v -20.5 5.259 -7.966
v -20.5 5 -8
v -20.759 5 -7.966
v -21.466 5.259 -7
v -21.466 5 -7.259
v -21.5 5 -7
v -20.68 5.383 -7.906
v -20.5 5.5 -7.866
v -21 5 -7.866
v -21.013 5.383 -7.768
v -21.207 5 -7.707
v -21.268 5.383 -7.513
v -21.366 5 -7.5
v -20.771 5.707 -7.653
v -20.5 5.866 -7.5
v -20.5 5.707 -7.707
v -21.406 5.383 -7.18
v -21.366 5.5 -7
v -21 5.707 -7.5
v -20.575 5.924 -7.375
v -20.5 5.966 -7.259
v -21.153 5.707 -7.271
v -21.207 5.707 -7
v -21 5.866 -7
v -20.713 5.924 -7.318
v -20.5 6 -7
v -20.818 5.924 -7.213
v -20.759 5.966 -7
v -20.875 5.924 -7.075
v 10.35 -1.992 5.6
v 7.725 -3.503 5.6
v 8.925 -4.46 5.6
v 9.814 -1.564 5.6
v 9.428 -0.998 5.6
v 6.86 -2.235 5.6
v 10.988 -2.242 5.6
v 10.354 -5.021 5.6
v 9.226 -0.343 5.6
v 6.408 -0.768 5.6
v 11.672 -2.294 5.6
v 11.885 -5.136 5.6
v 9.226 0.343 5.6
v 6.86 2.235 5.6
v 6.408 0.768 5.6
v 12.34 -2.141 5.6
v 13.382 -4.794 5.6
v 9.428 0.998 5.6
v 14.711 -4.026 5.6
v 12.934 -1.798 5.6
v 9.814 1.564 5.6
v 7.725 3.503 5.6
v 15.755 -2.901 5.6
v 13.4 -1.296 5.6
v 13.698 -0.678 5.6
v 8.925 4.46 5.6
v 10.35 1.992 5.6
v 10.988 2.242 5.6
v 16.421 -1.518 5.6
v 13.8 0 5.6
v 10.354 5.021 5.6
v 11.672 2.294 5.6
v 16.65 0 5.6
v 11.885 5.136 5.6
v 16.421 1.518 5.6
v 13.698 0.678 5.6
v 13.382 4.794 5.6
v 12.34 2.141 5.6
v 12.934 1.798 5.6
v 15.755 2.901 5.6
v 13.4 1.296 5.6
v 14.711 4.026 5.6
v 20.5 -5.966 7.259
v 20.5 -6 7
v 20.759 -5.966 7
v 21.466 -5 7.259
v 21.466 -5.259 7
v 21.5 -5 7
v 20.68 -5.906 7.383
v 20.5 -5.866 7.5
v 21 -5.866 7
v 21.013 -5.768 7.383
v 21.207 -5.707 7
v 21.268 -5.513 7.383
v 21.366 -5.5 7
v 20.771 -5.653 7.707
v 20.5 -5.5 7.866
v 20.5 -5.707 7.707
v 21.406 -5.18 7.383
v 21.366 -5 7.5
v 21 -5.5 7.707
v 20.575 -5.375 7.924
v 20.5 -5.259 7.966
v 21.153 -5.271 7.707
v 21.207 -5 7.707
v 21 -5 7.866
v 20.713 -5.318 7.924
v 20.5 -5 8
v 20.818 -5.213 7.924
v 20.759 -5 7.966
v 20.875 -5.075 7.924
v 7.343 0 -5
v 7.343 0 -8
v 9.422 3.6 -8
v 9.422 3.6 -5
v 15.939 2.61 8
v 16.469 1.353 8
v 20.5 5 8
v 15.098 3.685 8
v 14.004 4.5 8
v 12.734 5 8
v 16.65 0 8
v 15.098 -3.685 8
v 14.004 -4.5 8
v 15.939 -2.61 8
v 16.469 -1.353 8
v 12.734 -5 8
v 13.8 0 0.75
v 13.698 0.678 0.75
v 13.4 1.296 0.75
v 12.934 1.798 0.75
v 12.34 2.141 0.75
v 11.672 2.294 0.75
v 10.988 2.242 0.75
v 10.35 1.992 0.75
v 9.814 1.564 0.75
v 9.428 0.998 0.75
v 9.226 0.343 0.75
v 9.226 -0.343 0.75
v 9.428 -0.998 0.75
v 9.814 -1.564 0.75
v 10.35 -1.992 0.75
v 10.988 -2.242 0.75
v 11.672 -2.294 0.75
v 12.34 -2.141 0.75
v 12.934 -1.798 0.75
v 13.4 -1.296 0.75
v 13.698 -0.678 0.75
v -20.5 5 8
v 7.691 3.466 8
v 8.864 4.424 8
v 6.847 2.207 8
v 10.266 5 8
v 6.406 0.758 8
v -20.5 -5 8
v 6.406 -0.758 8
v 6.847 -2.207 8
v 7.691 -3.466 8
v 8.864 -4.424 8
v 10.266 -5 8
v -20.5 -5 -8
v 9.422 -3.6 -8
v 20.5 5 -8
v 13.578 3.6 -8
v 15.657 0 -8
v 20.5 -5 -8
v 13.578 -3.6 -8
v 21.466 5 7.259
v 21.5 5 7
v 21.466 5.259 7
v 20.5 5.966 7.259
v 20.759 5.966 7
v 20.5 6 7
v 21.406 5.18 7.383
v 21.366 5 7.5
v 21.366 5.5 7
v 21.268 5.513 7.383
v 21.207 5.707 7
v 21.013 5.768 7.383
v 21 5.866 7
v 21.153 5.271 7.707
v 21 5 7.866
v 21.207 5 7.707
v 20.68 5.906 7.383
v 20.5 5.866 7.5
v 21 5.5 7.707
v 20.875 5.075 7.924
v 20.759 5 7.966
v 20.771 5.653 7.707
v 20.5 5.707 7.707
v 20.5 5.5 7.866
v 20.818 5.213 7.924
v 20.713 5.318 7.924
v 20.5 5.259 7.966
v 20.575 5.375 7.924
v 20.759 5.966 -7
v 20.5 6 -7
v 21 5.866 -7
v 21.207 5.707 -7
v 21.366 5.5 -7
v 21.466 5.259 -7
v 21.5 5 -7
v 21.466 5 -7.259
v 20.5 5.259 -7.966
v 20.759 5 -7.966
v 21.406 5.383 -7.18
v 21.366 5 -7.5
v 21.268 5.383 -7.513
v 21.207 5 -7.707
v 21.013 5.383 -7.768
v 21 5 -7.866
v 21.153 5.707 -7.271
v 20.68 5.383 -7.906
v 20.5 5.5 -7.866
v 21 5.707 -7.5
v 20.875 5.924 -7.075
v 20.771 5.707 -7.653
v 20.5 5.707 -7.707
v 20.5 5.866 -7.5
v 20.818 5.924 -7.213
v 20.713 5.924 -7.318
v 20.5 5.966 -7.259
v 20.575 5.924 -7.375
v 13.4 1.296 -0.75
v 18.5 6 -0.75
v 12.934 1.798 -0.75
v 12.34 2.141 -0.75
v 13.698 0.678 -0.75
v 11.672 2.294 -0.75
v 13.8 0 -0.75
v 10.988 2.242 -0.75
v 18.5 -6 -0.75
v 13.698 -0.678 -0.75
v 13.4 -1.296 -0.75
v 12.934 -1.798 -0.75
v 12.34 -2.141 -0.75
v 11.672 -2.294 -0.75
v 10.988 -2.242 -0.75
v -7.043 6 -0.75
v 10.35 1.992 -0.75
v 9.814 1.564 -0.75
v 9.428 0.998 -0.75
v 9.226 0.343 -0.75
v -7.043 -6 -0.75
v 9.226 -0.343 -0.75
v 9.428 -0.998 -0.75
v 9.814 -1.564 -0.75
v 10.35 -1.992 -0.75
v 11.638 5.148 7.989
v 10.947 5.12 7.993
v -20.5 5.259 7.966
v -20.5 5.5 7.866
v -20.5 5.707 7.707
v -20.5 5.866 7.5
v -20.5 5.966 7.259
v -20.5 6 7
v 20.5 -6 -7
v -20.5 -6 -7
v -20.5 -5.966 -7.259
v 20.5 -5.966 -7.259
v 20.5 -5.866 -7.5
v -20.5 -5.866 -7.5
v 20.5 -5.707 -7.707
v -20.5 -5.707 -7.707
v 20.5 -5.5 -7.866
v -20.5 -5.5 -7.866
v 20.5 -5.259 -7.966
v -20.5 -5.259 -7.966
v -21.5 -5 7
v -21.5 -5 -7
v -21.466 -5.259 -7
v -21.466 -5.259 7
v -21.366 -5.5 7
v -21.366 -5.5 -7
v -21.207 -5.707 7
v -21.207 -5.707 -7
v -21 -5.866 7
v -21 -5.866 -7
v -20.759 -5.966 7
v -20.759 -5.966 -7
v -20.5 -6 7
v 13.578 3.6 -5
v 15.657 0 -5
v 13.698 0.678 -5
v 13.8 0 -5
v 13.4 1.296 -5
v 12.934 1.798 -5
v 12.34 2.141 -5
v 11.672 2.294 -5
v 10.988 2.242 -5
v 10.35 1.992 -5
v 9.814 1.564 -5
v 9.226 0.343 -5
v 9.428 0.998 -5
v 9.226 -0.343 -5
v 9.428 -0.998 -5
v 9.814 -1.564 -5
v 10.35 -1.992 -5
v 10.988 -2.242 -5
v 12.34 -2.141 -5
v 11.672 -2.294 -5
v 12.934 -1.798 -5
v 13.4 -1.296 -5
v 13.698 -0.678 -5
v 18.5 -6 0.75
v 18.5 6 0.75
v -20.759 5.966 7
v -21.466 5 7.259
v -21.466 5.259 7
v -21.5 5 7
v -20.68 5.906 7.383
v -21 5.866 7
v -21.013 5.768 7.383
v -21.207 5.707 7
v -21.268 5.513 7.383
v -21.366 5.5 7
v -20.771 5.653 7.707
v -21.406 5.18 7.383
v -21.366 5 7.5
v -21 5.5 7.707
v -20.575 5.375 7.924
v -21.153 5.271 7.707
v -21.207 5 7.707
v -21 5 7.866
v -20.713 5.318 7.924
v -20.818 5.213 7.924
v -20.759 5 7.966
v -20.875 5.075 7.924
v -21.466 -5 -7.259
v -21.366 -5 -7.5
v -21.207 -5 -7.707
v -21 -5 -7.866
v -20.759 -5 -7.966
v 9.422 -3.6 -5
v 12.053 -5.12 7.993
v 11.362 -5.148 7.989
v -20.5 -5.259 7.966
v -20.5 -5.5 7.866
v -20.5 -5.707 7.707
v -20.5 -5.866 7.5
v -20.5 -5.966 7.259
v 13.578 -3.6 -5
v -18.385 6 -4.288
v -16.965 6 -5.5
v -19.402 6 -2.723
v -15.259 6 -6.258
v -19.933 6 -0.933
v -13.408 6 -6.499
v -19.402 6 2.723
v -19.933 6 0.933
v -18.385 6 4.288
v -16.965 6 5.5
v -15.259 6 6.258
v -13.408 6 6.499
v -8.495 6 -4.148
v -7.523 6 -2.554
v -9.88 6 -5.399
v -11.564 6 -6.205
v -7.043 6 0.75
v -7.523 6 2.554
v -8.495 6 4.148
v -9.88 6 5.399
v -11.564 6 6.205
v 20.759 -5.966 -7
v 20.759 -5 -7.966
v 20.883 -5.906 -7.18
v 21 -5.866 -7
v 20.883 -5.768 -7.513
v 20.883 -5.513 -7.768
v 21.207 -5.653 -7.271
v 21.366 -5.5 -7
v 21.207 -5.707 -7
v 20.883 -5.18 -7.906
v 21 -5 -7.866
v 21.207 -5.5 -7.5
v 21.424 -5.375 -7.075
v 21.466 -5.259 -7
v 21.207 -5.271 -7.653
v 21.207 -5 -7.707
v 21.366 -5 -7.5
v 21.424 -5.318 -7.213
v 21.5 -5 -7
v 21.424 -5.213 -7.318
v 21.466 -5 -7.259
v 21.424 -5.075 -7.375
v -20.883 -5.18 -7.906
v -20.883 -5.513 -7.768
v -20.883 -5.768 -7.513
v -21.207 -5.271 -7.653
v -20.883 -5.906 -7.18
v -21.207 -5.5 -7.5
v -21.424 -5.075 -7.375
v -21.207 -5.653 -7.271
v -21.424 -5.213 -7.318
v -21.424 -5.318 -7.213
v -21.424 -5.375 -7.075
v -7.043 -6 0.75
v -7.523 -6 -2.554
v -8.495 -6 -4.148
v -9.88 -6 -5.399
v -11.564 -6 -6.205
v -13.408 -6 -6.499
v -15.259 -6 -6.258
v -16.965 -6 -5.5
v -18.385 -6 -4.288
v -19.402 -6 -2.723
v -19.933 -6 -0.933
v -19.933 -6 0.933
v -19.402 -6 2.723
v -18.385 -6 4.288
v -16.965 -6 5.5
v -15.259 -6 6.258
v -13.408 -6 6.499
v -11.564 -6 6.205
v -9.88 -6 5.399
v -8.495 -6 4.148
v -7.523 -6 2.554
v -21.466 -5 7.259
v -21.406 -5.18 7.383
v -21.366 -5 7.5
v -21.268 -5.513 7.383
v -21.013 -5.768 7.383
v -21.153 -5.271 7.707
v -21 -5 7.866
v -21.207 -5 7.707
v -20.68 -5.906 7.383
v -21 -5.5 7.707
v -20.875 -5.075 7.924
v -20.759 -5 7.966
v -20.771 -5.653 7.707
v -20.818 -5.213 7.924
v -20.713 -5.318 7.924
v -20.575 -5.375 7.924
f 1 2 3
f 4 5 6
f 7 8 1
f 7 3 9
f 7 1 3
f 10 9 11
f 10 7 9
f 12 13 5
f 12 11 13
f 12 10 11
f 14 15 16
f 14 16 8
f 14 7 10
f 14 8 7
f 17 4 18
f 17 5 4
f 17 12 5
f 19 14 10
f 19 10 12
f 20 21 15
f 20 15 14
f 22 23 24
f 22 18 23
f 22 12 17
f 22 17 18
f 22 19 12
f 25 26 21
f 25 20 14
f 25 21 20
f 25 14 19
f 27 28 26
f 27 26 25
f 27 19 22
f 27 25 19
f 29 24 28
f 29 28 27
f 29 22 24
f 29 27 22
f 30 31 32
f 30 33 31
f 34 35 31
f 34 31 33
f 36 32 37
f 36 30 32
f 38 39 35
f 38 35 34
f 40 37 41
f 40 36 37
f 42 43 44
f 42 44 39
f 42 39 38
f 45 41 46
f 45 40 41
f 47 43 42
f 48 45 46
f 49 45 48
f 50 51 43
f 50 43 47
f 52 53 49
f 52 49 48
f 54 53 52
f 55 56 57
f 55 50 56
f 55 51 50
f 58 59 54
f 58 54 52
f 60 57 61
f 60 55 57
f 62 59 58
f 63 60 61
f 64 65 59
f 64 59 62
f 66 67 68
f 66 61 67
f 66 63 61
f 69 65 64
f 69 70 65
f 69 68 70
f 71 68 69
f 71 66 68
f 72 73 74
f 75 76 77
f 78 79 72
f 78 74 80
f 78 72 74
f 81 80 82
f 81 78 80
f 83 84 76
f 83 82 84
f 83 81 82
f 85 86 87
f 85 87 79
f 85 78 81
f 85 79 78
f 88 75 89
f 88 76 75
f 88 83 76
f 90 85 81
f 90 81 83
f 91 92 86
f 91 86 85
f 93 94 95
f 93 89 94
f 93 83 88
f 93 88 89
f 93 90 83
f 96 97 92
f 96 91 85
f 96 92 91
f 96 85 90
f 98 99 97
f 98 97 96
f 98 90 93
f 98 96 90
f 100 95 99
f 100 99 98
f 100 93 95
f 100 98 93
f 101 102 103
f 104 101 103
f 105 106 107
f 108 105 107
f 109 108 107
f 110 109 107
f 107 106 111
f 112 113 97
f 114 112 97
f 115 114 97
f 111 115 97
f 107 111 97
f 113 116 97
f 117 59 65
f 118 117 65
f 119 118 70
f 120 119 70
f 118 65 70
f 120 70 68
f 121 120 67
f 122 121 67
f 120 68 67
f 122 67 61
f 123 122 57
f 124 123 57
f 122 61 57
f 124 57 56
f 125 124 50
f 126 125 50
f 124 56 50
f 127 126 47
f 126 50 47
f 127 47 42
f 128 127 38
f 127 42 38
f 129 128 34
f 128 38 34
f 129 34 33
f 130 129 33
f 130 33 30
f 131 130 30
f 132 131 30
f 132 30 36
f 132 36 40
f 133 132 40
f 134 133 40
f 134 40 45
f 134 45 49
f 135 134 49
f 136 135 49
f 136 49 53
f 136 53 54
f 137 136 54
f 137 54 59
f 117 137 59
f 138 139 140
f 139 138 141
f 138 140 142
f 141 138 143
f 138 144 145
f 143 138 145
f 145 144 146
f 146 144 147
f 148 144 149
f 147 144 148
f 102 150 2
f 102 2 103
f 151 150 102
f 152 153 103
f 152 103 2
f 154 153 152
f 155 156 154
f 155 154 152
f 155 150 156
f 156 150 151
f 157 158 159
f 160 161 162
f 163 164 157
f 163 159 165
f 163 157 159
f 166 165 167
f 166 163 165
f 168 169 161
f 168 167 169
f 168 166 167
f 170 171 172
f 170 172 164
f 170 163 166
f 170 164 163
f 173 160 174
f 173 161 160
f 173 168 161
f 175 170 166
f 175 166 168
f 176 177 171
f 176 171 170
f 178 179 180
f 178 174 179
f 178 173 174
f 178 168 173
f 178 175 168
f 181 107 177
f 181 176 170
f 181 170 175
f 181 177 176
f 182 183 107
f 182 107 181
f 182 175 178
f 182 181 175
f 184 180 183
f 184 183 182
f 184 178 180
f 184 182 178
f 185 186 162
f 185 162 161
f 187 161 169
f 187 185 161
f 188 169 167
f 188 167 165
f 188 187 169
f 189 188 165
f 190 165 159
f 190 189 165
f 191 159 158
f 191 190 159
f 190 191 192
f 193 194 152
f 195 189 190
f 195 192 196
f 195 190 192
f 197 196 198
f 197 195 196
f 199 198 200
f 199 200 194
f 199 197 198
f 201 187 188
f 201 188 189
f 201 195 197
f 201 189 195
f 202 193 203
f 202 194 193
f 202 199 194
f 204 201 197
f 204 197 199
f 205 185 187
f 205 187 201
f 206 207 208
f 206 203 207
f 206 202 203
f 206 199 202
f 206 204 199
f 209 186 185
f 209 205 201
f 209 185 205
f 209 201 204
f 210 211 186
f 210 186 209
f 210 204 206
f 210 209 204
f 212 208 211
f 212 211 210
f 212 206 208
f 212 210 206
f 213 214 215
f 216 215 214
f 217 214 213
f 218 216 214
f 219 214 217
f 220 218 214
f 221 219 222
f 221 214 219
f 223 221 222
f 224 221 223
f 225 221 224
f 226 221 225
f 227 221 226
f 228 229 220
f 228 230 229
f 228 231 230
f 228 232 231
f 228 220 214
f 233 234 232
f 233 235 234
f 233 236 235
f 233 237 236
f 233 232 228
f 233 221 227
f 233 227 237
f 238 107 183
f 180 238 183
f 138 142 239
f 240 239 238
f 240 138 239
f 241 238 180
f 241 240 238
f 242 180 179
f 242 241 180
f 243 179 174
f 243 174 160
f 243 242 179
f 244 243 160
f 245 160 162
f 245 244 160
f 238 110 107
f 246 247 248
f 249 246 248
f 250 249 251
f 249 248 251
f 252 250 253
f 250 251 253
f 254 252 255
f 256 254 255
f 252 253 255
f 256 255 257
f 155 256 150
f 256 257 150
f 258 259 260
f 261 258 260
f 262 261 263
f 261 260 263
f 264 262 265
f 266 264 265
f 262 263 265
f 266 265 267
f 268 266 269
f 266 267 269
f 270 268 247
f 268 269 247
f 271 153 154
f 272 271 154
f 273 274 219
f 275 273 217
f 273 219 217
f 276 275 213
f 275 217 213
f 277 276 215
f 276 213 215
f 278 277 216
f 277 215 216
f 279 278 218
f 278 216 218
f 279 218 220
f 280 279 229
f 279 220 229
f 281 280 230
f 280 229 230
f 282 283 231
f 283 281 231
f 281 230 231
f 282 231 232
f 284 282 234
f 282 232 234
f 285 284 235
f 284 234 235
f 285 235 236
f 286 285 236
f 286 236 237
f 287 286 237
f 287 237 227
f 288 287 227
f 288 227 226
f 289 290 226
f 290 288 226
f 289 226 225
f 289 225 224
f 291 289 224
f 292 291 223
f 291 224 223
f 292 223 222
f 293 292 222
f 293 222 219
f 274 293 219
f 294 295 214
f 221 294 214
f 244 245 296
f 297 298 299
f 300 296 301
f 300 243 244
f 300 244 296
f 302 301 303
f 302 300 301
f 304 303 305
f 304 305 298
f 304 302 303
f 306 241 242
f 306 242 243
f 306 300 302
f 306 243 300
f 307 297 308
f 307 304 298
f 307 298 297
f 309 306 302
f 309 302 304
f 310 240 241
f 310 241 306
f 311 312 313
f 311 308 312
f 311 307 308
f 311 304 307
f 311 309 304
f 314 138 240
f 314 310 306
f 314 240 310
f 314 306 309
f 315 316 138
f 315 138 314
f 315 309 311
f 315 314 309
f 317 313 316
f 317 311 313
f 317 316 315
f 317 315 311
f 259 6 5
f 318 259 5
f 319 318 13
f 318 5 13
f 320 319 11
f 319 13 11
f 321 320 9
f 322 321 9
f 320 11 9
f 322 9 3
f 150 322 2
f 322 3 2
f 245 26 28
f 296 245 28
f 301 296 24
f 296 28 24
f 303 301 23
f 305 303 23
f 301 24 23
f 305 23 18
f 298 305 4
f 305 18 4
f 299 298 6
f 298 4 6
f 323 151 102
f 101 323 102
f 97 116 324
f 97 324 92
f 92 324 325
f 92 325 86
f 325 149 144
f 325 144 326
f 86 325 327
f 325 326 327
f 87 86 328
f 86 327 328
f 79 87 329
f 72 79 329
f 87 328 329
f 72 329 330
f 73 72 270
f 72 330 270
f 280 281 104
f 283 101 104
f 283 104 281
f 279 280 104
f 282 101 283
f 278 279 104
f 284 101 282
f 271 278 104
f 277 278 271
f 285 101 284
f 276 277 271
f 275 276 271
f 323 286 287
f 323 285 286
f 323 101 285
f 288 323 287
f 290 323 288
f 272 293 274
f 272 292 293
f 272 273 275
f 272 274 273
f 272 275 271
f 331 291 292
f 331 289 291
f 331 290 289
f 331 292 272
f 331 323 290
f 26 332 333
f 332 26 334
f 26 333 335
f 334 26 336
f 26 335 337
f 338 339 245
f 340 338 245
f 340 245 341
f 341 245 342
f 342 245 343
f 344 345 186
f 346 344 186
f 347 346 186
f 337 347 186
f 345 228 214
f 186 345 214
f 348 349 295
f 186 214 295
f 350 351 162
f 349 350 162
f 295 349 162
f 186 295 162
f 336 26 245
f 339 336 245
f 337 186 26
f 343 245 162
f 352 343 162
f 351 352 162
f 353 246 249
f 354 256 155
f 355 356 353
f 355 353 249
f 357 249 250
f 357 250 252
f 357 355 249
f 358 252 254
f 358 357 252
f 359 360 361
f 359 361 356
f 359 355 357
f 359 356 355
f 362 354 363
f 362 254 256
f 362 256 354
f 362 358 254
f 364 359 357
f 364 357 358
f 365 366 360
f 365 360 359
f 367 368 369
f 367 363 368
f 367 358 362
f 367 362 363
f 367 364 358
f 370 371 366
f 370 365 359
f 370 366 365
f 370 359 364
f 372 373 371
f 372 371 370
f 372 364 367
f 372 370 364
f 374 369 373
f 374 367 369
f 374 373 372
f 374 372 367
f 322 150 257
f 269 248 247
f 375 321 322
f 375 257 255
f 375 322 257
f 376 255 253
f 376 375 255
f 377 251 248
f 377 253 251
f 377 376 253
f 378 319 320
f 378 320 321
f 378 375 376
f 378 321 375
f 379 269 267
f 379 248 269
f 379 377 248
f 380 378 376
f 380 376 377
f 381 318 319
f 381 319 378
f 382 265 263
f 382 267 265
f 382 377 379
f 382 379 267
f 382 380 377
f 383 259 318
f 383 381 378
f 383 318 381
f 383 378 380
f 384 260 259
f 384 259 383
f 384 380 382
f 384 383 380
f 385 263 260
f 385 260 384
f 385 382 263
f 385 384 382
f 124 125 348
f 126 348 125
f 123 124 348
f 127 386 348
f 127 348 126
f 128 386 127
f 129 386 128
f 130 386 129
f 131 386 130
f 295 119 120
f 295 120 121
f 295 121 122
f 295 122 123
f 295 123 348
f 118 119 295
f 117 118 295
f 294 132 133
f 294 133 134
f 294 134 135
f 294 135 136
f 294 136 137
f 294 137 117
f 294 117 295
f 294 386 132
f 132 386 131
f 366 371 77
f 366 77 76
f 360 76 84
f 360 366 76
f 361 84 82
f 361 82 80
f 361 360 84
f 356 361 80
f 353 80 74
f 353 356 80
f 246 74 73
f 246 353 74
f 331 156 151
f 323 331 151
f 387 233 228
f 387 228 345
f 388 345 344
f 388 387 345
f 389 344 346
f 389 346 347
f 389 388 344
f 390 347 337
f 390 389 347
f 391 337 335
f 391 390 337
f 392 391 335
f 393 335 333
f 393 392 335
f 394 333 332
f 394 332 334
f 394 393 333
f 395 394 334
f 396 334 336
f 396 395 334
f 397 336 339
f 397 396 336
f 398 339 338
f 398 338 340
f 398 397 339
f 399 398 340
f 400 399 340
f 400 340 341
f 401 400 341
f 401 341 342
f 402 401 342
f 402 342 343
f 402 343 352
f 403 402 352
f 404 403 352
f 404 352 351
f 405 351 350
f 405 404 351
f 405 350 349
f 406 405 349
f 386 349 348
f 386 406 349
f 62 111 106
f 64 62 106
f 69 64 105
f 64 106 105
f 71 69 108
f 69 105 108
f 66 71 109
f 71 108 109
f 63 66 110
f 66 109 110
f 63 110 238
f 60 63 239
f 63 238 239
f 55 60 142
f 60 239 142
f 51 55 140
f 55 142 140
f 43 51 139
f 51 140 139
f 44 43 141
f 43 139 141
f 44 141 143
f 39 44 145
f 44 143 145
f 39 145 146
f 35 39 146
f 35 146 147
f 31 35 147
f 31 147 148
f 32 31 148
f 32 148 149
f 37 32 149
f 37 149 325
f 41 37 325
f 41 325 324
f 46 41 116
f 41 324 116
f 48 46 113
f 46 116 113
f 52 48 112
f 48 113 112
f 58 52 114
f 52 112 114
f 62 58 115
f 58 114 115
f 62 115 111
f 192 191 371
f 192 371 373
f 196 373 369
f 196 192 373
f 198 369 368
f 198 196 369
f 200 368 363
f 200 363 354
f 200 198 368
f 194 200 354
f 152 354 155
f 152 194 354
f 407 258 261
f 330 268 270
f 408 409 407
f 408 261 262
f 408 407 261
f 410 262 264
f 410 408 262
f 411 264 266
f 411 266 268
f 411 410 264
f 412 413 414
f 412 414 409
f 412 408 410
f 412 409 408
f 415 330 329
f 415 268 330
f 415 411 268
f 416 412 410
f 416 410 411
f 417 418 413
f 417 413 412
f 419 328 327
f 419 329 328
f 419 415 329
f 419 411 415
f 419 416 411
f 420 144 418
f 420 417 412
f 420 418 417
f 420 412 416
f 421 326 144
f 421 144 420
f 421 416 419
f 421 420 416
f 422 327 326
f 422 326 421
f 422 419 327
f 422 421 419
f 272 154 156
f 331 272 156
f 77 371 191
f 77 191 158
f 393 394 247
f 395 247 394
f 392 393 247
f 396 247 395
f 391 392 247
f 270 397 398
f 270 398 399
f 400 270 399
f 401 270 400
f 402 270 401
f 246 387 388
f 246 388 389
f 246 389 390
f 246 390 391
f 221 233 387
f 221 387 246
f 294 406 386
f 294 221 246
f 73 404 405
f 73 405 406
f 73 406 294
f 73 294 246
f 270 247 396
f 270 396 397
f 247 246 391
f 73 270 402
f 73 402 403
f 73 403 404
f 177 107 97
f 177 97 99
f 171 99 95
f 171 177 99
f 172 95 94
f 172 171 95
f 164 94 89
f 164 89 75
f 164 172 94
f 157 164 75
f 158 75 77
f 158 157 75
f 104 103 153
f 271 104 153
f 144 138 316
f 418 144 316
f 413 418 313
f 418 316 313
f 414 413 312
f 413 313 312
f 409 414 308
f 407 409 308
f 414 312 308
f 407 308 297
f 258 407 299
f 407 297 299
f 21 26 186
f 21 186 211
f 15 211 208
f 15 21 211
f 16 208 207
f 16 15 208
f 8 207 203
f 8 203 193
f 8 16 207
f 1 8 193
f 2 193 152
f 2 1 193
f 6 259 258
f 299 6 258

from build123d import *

# Parameters (mm, degrees)
F0_W         = 43
F0_H         = 16
F1_DEPTH     = 6
F2_R         = 2.3
F3_DEPTH     = 16
F2_R_2       = 5.15
F4_DEPTH     = 2.4
F5_R         = 2.3
F6_DEPTH     = 3
F7_T1_DEPTH  = 10
F7_T3_DEPTH  = 41
F7_T5_DEPTH  = 14
F7_S9_W      = 1
F7_S9_H      = 1
F7_T10_DEPTH = 1
F7_S15_W     = 1
F7_S15_H     = 1
F7_T16_DEPTH = 1
F7_S21_W     = 1
F7_S21_H     = 1
F7_T22_DEPTH = 1
F7_S27_W     = 1
F7_S27_H     = 1
F7_T28_DEPTH = 1
F7_S33_W     = 1
F7_S33_H     = 1
F7_T34_DEPTH = 1
F7_S39_W     = 1
F7_S39_H     = 1
F7_T40_DEPTH = 1
F7_S45_W     = 1
F7_S45_H     = 1
F7_T46_DEPTH = 1
F7_S51_W     = 1
F7_S51_H     = 1
F7_T52_DEPTH = 1


# Not quite as in the source:
# - a fillet or chamfer that OpenCascade refuses, or shapes differently, is made with other operations: its cross-section is extruded or revolved along the edge and cut away or added


with BuildPart() as f1:
    # F0 (on Front) → F1 (new body, symmetric)
    with BuildSketch(Plane.XZ):
        Rectangle(F0_W, F0_H)
        with BuildLine():
            ThreePointArc((-7.0434142149, -0.75), (-20, 0), (-7.0434142149, 0.75))
            Line((-7.0434142149, 0.75), (18.5, 0.75))
            Line((18.5, 0.75), (18.5, -0.75))
            Line((18.5, -0.75), (-7.0434142149, -0.75))
        make_face(mode=Mode.SUBTRACT)
    extrude(amount=F1_DEPTH, both=True)

    # F2 (on face) → F3 (cut, through all)
    with BuildSketch(Plane.XY.offset(8)):
        with Locations((11.5, 0)):
            Circle(F2_R)
    extrude(amount=-F3_DEPTH, mode=Mode.SUBTRACT)

    # F2 (on face) → F4 (cut)
    with BuildSketch(Plane.XY.offset(8)):
        with Locations((11.5, 0)):
            Circle(F2_R_2)
        with Locations((11.5, 0)):
            Circle(F2_R, mode=Mode.SUBTRACT)
    extrude(amount=-F4_DEPTH, mode=Mode.SUBTRACT)

    # F5 (on face) → F6 (cut)
    with BuildSketch(Plane(origin=(0, 0, -8), x_dir=(1, 0, 0), z_dir=(0, 0, -1))):
        Polygon((13.5784609691, 3.6), (9.4215390309, 3.6), (7.3430780618, 0), (9.4215390309, -3.6), (13.5784609691, -3.6), (15.6569219382, 0), align=None)
        with Locations((11.5, 0)):
            Circle(F5_R, mode=Mode.SUBTRACT)
    extrude(amount=-F6_DEPTH, mode=Mode.SUBTRACT)

    # F7: fillet of radius 1 on 12 edges, made by hand

    # F7_s2 → F7_t1 (cut)
    with BuildSketch(Plane.XZ.offset(-5)):
        with BuildLine():
            ThreePointArc((-21.5, -7), (-21.2071067812, -7.7071067812), (-20.5, -8))
            Line((-20.5, -8), (-21.5, -8))
            Line((-21.5, -8), (-21.5, -7))
        make_face()
        with BuildLine():
            ThreePointArc((21.5, -7), (21.2071067812, -7.7071067812), (20.5, -8))
            Line((20.5, -8), (21.5, -8))
            Line((21.5, -8), (21.5, -7))
        make_face()
        with BuildLine():
            ThreePointArc((-20.5, 8), (-21.2071067812, 7.7071067812), (-21.5, 7))
            Line((-21.5, 7), (-21.5, 8))
            Line((-21.5, 8), (-20.5, 8))
        make_face()
        with BuildLine():
            ThreePointArc((20.5, 8), (21.2071067812, 7.7071067812), (21.5, 7))
            Line((21.5, 7), (21.5, 8))
            Line((21.5, 8), (20.5, 8))
        make_face()
    extrude(amount=F7_T1_DEPTH, mode=Mode.SUBTRACT)

    # F7_s4 → F7_t3 (cut)
    with BuildSketch(Plane.YZ.offset(-20.5)):
        with BuildLine():
            ThreePointArc((-6, -7), (-5.7071067812, -7.7071067812), (-5, -8))
            Line((-5, -8), (-6, -8))
            Line((-6, -8), (-6, -7))
        make_face()
        with BuildLine():
            ThreePointArc((6, -7), (5.7071067812, -7.7071067812), (5, -8))
            Line((5, -8), (6, -8))
            Line((6, -8), (6, -7))
        make_face()
        with BuildLine():
            ThreePointArc((-5, 8), (-5.7071067812, 7.7071067812), (-6, 7))
            Line((-6, 7), (-6, 8))
            Line((-6, 8), (-5, 8))
        make_face()
        with BuildLine():
            ThreePointArc((5, 8), (5.7071067812, 7.7071067812), (6, 7))
            Line((6, 7), (6, 8))
            Line((6, 8), (5, 8))
        make_face()
    extrude(amount=F7_T3_DEPTH, mode=Mode.SUBTRACT)

    # F7_s6 → F7_t5 (cut)
    with BuildSketch(Plane.XY.offset(-7)):
        with BuildLine():
            ThreePointArc((20.5, 6), (21.2071067812, 5.7071067812), (21.5, 5))
            Line((21.5, 5), (21.5, 6))
            Line((21.5, 6), (20.5, 6))
        make_face()
        with BuildLine():
            ThreePointArc((21.5, -5), (21.2071067812, -5.7071067812), (20.5, -6))
            Line((20.5, -6), (21.5, -6))
            Line((21.5, -6), (21.5, -5))
        make_face()
        with BuildLine():
            ThreePointArc((-20.5, 6), (-21.2071067812, 5.7071067812), (-21.5, 5))
            Line((-21.5, 5), (-21.5, 6))
            Line((-21.5, 6), (-20.5, 6))
        make_face()
        with BuildLine():
            ThreePointArc((-21.5, -5), (-21.2071067812, -5.7071067812), (-20.5, -6))
            Line((-20.5, -6), (-21.5, -6))
            Line((-21.5, -6), (-21.5, -5))
        make_face()
    extrude(amount=F7_T5_DEPTH, mode=Mode.SUBTRACT)


with BuildPart() as f7_tool8:
    # F7_s9 → F7_t10 (new body)
    with BuildSketch(Plane.XZ.offset(-5)):
        with Locations((-21, -7.5)):
            Rectangle(F7_S9_W, F7_S9_H)
    extrude(amount=-F7_T10_DEPTH)

    # F7_s11 → F7_t12 (revolve, cut)
    with BuildSketch(Plane(origin=(-20.5, 5, -7), x_dir=(0.7071067812, 0, 0.7071067812), z_dir=(-0.7071067812, 0, 0.7071067812))):
        with BuildLine():
            ThreePointArc((0, -1), (1, 0), (0, 1))
            Line((0, 1), (0, -1))
        make_face()
    revolve(axis=Axis((-20.5, 5, -7), (0, 1, 0)), mode=Mode.SUBTRACT)


with BuildPart() as f1_1:
    add(f1.part)

    # F7_t7: cut F7_tool8
    add(f7_tool8.part, mode=Mode.SUBTRACT)


with BuildPart() as f7_tool14:
    # F7_s15 → F7_t16 (new body)
    with BuildSketch(Plane.YZ.offset(-20.5)):
        with Locations((-5.5, -7.5)):
            Rectangle(F7_S15_W, F7_S15_H)
    extrude(amount=-F7_T16_DEPTH)

    # F7_s17 → F7_t18 (revolve, cut)
    with BuildSketch(Plane(origin=(-20.5, -5, -7), x_dir=(0, 0.7071067812, 0.7071067812), z_dir=(0, -0.7071067812, 0.7071067812))):
        with BuildLine():
            ThreePointArc((0, -1), (1, 0), (0, 1))
            Line((0, 1), (0, -1))
        make_face()
    revolve(axis=Axis((-20.5, -5, -7), (-1, 0, 0)), mode=Mode.SUBTRACT)


with BuildPart() as f1_2:
    add(f1_1.part)

    # F7_t13: cut F7_tool14
    add(f7_tool14.part, mode=Mode.SUBTRACT)


with BuildPart() as f7_tool20:
    # F7_s21 → F7_t22 (new body)
    with BuildSketch(Plane.YZ.offset(20.5)):
        with Locations((-5.5, -7.5)):
            Rectangle(F7_S21_W, F7_S21_H)
    extrude(amount=F7_T22_DEPTH)

    # F7_s23 → F7_t24 (revolve, cut)
    with BuildSketch(Plane(origin=(20.5, -5, -7), x_dir=(0, 0.7071067812, 0.7071067812), z_dir=(0, 0.7071067812, -0.7071067812))):
        with BuildLine():
            ThreePointArc((0, -1), (1, 0), (0, 1))
            Line((0, 1), (0, -1))
        make_face()
    revolve(axis=Axis((20.5, -5, -7), (1, 0, 0)), mode=Mode.SUBTRACT)


with BuildPart() as f1_3:
    add(f1_2.part)

    # F7_t19: cut F7_tool20
    add(f7_tool20.part, mode=Mode.SUBTRACT)


with BuildPart() as f7_tool26:
    # F7_s27 → F7_t28 (new body)
    with BuildSketch(Plane.XZ.offset(-5)):
        with Locations((21, -7.5)):
            Rectangle(F7_S27_W, F7_S27_H)
    extrude(amount=-F7_T28_DEPTH)

    # F7_s29 → F7_t30 (revolve, cut)
    with BuildSketch(Plane(origin=(20.5, 5, -7), x_dir=(-0.7071067812, 0, 0.7071067812), z_dir=(-0.7071067812, 0, -0.7071067812))):
        with BuildLine():
            ThreePointArc((0, -1), (1, 0), (0, 1))
            Line((0, 1), (0, -1))
        make_face()
    revolve(axis=Axis((20.5, 5, -7), (0, 1, 0)), mode=Mode.SUBTRACT)


with BuildPart() as f1_4:
    add(f1_3.part)

    # F7_t25: cut F7_tool26
    add(f7_tool26.part, mode=Mode.SUBTRACT)


with BuildPart() as f7_tool32:
    # F7_s33 → F7_t34 (new body)
    with BuildSketch(Plane.XY.offset(7)):
        with Locations((21, 5.5)):
            Rectangle(F7_S33_W, F7_S33_H)
    extrude(amount=F7_T34_DEPTH)

    # F7_s35 → F7_t36 (revolve, cut)
    with BuildSketch(Plane(origin=(20.5, 5, 7), x_dir=(-0.7071067812, -0.7071067812, 0), z_dir=(-0.7071067812, 0.7071067812, 0))):
        with BuildLine():
            ThreePointArc((0, -1), (1, 0), (0, 1))
            Line((0, 1), (0, -1))
        make_face()
    revolve(axis=Axis((20.5, 5, 7), (0, 0, 1)), mode=Mode.SUBTRACT)


with BuildPart() as f1_5:
    add(f1_4.part)

    # F7_t31: cut F7_tool32
    add(f7_tool32.part, mode=Mode.SUBTRACT)


with BuildPart() as f7_tool38:
    # F7_s39 → F7_t40 (new body)
    with BuildSketch(Plane.XY.offset(7)):
        with Locations((21, -5.5)):
            Rectangle(F7_S39_W, F7_S39_H)
    extrude(amount=F7_T40_DEPTH)

    # F7_s41 → F7_t42 (revolve, cut)
    with BuildSketch(Plane(origin=(20.5, -5, 7), x_dir=(-0.7071067812, 0.7071067812, 0), z_dir=(0.7071067812, 0.7071067812, 0))):
        with BuildLine():
            ThreePointArc((0, -1), (1, 0), (0, 1))
            Line((0, 1), (0, -1))
        make_face()
    revolve(axis=Axis((20.5, -5, 7), (0, 0, 1)), mode=Mode.SUBTRACT)


with BuildPart() as f1_6:
    add(f1_5.part)

    # F7_t37: cut F7_tool38
    add(f7_tool38.part, mode=Mode.SUBTRACT)


with BuildPart() as f7_tool44:
    # F7_s45 → F7_t46 (new body)
    with BuildSketch(Plane.XY.offset(7)):
        with Locations((-21, 5.5)):
            Rectangle(F7_S45_W, F7_S45_H)
    extrude(amount=F7_T46_DEPTH)

    # F7_s47 → F7_t48 (revolve, cut)
    with BuildSketch(Plane(origin=(-20.5, 5, 7), x_dir=(0.7071067812, -0.7071067812, 0), z_dir=(-0.7071067812, -0.7071067812, 0))):
        with BuildLine():
            ThreePointArc((0, -1), (1, 0), (0, 1))
            Line((0, 1), (0, -1))
        make_face()
    revolve(axis=Axis((-20.5, 5, 7), (0, 0, 1)), mode=Mode.SUBTRACT)


with BuildPart() as f1_7:
    add(f1_6.part)

    # F7_t43: cut F7_tool44
    add(f7_tool44.part, mode=Mode.SUBTRACT)


with BuildPart() as f7_tool50:
    # F7_s51 → F7_t52 (new body)
    with BuildSketch(Plane.XY.offset(7)):
        with Locations((-21, -5.5)):
            Rectangle(F7_S51_W, F7_S51_H)
    extrude(amount=F7_T52_DEPTH)

    # F7_s53 → F7_t54 (revolve, cut)
    with BuildSketch(Plane(origin=(-20.5, -5, 7), x_dir=(0.7071067812, 0.7071067812, 0), z_dir=(0.7071067812, -0.7071067812, 0))):
        with BuildLine():
            ThreePointArc((0, -1), (1, 0), (0, 1))
            Line((0, 1), (0, -1))
        make_face()
    revolve(axis=Axis((-20.5, -5, 7), (0, 0, 1)), mode=Mode.SUBTRACT)


with BuildPart() as f1_8:
    add(f1_7.part)

    # F7_t49: cut F7_tool50
    add(f7_tool50.part, mode=Mode.SUBTRACT)


solid = f1_8.part
